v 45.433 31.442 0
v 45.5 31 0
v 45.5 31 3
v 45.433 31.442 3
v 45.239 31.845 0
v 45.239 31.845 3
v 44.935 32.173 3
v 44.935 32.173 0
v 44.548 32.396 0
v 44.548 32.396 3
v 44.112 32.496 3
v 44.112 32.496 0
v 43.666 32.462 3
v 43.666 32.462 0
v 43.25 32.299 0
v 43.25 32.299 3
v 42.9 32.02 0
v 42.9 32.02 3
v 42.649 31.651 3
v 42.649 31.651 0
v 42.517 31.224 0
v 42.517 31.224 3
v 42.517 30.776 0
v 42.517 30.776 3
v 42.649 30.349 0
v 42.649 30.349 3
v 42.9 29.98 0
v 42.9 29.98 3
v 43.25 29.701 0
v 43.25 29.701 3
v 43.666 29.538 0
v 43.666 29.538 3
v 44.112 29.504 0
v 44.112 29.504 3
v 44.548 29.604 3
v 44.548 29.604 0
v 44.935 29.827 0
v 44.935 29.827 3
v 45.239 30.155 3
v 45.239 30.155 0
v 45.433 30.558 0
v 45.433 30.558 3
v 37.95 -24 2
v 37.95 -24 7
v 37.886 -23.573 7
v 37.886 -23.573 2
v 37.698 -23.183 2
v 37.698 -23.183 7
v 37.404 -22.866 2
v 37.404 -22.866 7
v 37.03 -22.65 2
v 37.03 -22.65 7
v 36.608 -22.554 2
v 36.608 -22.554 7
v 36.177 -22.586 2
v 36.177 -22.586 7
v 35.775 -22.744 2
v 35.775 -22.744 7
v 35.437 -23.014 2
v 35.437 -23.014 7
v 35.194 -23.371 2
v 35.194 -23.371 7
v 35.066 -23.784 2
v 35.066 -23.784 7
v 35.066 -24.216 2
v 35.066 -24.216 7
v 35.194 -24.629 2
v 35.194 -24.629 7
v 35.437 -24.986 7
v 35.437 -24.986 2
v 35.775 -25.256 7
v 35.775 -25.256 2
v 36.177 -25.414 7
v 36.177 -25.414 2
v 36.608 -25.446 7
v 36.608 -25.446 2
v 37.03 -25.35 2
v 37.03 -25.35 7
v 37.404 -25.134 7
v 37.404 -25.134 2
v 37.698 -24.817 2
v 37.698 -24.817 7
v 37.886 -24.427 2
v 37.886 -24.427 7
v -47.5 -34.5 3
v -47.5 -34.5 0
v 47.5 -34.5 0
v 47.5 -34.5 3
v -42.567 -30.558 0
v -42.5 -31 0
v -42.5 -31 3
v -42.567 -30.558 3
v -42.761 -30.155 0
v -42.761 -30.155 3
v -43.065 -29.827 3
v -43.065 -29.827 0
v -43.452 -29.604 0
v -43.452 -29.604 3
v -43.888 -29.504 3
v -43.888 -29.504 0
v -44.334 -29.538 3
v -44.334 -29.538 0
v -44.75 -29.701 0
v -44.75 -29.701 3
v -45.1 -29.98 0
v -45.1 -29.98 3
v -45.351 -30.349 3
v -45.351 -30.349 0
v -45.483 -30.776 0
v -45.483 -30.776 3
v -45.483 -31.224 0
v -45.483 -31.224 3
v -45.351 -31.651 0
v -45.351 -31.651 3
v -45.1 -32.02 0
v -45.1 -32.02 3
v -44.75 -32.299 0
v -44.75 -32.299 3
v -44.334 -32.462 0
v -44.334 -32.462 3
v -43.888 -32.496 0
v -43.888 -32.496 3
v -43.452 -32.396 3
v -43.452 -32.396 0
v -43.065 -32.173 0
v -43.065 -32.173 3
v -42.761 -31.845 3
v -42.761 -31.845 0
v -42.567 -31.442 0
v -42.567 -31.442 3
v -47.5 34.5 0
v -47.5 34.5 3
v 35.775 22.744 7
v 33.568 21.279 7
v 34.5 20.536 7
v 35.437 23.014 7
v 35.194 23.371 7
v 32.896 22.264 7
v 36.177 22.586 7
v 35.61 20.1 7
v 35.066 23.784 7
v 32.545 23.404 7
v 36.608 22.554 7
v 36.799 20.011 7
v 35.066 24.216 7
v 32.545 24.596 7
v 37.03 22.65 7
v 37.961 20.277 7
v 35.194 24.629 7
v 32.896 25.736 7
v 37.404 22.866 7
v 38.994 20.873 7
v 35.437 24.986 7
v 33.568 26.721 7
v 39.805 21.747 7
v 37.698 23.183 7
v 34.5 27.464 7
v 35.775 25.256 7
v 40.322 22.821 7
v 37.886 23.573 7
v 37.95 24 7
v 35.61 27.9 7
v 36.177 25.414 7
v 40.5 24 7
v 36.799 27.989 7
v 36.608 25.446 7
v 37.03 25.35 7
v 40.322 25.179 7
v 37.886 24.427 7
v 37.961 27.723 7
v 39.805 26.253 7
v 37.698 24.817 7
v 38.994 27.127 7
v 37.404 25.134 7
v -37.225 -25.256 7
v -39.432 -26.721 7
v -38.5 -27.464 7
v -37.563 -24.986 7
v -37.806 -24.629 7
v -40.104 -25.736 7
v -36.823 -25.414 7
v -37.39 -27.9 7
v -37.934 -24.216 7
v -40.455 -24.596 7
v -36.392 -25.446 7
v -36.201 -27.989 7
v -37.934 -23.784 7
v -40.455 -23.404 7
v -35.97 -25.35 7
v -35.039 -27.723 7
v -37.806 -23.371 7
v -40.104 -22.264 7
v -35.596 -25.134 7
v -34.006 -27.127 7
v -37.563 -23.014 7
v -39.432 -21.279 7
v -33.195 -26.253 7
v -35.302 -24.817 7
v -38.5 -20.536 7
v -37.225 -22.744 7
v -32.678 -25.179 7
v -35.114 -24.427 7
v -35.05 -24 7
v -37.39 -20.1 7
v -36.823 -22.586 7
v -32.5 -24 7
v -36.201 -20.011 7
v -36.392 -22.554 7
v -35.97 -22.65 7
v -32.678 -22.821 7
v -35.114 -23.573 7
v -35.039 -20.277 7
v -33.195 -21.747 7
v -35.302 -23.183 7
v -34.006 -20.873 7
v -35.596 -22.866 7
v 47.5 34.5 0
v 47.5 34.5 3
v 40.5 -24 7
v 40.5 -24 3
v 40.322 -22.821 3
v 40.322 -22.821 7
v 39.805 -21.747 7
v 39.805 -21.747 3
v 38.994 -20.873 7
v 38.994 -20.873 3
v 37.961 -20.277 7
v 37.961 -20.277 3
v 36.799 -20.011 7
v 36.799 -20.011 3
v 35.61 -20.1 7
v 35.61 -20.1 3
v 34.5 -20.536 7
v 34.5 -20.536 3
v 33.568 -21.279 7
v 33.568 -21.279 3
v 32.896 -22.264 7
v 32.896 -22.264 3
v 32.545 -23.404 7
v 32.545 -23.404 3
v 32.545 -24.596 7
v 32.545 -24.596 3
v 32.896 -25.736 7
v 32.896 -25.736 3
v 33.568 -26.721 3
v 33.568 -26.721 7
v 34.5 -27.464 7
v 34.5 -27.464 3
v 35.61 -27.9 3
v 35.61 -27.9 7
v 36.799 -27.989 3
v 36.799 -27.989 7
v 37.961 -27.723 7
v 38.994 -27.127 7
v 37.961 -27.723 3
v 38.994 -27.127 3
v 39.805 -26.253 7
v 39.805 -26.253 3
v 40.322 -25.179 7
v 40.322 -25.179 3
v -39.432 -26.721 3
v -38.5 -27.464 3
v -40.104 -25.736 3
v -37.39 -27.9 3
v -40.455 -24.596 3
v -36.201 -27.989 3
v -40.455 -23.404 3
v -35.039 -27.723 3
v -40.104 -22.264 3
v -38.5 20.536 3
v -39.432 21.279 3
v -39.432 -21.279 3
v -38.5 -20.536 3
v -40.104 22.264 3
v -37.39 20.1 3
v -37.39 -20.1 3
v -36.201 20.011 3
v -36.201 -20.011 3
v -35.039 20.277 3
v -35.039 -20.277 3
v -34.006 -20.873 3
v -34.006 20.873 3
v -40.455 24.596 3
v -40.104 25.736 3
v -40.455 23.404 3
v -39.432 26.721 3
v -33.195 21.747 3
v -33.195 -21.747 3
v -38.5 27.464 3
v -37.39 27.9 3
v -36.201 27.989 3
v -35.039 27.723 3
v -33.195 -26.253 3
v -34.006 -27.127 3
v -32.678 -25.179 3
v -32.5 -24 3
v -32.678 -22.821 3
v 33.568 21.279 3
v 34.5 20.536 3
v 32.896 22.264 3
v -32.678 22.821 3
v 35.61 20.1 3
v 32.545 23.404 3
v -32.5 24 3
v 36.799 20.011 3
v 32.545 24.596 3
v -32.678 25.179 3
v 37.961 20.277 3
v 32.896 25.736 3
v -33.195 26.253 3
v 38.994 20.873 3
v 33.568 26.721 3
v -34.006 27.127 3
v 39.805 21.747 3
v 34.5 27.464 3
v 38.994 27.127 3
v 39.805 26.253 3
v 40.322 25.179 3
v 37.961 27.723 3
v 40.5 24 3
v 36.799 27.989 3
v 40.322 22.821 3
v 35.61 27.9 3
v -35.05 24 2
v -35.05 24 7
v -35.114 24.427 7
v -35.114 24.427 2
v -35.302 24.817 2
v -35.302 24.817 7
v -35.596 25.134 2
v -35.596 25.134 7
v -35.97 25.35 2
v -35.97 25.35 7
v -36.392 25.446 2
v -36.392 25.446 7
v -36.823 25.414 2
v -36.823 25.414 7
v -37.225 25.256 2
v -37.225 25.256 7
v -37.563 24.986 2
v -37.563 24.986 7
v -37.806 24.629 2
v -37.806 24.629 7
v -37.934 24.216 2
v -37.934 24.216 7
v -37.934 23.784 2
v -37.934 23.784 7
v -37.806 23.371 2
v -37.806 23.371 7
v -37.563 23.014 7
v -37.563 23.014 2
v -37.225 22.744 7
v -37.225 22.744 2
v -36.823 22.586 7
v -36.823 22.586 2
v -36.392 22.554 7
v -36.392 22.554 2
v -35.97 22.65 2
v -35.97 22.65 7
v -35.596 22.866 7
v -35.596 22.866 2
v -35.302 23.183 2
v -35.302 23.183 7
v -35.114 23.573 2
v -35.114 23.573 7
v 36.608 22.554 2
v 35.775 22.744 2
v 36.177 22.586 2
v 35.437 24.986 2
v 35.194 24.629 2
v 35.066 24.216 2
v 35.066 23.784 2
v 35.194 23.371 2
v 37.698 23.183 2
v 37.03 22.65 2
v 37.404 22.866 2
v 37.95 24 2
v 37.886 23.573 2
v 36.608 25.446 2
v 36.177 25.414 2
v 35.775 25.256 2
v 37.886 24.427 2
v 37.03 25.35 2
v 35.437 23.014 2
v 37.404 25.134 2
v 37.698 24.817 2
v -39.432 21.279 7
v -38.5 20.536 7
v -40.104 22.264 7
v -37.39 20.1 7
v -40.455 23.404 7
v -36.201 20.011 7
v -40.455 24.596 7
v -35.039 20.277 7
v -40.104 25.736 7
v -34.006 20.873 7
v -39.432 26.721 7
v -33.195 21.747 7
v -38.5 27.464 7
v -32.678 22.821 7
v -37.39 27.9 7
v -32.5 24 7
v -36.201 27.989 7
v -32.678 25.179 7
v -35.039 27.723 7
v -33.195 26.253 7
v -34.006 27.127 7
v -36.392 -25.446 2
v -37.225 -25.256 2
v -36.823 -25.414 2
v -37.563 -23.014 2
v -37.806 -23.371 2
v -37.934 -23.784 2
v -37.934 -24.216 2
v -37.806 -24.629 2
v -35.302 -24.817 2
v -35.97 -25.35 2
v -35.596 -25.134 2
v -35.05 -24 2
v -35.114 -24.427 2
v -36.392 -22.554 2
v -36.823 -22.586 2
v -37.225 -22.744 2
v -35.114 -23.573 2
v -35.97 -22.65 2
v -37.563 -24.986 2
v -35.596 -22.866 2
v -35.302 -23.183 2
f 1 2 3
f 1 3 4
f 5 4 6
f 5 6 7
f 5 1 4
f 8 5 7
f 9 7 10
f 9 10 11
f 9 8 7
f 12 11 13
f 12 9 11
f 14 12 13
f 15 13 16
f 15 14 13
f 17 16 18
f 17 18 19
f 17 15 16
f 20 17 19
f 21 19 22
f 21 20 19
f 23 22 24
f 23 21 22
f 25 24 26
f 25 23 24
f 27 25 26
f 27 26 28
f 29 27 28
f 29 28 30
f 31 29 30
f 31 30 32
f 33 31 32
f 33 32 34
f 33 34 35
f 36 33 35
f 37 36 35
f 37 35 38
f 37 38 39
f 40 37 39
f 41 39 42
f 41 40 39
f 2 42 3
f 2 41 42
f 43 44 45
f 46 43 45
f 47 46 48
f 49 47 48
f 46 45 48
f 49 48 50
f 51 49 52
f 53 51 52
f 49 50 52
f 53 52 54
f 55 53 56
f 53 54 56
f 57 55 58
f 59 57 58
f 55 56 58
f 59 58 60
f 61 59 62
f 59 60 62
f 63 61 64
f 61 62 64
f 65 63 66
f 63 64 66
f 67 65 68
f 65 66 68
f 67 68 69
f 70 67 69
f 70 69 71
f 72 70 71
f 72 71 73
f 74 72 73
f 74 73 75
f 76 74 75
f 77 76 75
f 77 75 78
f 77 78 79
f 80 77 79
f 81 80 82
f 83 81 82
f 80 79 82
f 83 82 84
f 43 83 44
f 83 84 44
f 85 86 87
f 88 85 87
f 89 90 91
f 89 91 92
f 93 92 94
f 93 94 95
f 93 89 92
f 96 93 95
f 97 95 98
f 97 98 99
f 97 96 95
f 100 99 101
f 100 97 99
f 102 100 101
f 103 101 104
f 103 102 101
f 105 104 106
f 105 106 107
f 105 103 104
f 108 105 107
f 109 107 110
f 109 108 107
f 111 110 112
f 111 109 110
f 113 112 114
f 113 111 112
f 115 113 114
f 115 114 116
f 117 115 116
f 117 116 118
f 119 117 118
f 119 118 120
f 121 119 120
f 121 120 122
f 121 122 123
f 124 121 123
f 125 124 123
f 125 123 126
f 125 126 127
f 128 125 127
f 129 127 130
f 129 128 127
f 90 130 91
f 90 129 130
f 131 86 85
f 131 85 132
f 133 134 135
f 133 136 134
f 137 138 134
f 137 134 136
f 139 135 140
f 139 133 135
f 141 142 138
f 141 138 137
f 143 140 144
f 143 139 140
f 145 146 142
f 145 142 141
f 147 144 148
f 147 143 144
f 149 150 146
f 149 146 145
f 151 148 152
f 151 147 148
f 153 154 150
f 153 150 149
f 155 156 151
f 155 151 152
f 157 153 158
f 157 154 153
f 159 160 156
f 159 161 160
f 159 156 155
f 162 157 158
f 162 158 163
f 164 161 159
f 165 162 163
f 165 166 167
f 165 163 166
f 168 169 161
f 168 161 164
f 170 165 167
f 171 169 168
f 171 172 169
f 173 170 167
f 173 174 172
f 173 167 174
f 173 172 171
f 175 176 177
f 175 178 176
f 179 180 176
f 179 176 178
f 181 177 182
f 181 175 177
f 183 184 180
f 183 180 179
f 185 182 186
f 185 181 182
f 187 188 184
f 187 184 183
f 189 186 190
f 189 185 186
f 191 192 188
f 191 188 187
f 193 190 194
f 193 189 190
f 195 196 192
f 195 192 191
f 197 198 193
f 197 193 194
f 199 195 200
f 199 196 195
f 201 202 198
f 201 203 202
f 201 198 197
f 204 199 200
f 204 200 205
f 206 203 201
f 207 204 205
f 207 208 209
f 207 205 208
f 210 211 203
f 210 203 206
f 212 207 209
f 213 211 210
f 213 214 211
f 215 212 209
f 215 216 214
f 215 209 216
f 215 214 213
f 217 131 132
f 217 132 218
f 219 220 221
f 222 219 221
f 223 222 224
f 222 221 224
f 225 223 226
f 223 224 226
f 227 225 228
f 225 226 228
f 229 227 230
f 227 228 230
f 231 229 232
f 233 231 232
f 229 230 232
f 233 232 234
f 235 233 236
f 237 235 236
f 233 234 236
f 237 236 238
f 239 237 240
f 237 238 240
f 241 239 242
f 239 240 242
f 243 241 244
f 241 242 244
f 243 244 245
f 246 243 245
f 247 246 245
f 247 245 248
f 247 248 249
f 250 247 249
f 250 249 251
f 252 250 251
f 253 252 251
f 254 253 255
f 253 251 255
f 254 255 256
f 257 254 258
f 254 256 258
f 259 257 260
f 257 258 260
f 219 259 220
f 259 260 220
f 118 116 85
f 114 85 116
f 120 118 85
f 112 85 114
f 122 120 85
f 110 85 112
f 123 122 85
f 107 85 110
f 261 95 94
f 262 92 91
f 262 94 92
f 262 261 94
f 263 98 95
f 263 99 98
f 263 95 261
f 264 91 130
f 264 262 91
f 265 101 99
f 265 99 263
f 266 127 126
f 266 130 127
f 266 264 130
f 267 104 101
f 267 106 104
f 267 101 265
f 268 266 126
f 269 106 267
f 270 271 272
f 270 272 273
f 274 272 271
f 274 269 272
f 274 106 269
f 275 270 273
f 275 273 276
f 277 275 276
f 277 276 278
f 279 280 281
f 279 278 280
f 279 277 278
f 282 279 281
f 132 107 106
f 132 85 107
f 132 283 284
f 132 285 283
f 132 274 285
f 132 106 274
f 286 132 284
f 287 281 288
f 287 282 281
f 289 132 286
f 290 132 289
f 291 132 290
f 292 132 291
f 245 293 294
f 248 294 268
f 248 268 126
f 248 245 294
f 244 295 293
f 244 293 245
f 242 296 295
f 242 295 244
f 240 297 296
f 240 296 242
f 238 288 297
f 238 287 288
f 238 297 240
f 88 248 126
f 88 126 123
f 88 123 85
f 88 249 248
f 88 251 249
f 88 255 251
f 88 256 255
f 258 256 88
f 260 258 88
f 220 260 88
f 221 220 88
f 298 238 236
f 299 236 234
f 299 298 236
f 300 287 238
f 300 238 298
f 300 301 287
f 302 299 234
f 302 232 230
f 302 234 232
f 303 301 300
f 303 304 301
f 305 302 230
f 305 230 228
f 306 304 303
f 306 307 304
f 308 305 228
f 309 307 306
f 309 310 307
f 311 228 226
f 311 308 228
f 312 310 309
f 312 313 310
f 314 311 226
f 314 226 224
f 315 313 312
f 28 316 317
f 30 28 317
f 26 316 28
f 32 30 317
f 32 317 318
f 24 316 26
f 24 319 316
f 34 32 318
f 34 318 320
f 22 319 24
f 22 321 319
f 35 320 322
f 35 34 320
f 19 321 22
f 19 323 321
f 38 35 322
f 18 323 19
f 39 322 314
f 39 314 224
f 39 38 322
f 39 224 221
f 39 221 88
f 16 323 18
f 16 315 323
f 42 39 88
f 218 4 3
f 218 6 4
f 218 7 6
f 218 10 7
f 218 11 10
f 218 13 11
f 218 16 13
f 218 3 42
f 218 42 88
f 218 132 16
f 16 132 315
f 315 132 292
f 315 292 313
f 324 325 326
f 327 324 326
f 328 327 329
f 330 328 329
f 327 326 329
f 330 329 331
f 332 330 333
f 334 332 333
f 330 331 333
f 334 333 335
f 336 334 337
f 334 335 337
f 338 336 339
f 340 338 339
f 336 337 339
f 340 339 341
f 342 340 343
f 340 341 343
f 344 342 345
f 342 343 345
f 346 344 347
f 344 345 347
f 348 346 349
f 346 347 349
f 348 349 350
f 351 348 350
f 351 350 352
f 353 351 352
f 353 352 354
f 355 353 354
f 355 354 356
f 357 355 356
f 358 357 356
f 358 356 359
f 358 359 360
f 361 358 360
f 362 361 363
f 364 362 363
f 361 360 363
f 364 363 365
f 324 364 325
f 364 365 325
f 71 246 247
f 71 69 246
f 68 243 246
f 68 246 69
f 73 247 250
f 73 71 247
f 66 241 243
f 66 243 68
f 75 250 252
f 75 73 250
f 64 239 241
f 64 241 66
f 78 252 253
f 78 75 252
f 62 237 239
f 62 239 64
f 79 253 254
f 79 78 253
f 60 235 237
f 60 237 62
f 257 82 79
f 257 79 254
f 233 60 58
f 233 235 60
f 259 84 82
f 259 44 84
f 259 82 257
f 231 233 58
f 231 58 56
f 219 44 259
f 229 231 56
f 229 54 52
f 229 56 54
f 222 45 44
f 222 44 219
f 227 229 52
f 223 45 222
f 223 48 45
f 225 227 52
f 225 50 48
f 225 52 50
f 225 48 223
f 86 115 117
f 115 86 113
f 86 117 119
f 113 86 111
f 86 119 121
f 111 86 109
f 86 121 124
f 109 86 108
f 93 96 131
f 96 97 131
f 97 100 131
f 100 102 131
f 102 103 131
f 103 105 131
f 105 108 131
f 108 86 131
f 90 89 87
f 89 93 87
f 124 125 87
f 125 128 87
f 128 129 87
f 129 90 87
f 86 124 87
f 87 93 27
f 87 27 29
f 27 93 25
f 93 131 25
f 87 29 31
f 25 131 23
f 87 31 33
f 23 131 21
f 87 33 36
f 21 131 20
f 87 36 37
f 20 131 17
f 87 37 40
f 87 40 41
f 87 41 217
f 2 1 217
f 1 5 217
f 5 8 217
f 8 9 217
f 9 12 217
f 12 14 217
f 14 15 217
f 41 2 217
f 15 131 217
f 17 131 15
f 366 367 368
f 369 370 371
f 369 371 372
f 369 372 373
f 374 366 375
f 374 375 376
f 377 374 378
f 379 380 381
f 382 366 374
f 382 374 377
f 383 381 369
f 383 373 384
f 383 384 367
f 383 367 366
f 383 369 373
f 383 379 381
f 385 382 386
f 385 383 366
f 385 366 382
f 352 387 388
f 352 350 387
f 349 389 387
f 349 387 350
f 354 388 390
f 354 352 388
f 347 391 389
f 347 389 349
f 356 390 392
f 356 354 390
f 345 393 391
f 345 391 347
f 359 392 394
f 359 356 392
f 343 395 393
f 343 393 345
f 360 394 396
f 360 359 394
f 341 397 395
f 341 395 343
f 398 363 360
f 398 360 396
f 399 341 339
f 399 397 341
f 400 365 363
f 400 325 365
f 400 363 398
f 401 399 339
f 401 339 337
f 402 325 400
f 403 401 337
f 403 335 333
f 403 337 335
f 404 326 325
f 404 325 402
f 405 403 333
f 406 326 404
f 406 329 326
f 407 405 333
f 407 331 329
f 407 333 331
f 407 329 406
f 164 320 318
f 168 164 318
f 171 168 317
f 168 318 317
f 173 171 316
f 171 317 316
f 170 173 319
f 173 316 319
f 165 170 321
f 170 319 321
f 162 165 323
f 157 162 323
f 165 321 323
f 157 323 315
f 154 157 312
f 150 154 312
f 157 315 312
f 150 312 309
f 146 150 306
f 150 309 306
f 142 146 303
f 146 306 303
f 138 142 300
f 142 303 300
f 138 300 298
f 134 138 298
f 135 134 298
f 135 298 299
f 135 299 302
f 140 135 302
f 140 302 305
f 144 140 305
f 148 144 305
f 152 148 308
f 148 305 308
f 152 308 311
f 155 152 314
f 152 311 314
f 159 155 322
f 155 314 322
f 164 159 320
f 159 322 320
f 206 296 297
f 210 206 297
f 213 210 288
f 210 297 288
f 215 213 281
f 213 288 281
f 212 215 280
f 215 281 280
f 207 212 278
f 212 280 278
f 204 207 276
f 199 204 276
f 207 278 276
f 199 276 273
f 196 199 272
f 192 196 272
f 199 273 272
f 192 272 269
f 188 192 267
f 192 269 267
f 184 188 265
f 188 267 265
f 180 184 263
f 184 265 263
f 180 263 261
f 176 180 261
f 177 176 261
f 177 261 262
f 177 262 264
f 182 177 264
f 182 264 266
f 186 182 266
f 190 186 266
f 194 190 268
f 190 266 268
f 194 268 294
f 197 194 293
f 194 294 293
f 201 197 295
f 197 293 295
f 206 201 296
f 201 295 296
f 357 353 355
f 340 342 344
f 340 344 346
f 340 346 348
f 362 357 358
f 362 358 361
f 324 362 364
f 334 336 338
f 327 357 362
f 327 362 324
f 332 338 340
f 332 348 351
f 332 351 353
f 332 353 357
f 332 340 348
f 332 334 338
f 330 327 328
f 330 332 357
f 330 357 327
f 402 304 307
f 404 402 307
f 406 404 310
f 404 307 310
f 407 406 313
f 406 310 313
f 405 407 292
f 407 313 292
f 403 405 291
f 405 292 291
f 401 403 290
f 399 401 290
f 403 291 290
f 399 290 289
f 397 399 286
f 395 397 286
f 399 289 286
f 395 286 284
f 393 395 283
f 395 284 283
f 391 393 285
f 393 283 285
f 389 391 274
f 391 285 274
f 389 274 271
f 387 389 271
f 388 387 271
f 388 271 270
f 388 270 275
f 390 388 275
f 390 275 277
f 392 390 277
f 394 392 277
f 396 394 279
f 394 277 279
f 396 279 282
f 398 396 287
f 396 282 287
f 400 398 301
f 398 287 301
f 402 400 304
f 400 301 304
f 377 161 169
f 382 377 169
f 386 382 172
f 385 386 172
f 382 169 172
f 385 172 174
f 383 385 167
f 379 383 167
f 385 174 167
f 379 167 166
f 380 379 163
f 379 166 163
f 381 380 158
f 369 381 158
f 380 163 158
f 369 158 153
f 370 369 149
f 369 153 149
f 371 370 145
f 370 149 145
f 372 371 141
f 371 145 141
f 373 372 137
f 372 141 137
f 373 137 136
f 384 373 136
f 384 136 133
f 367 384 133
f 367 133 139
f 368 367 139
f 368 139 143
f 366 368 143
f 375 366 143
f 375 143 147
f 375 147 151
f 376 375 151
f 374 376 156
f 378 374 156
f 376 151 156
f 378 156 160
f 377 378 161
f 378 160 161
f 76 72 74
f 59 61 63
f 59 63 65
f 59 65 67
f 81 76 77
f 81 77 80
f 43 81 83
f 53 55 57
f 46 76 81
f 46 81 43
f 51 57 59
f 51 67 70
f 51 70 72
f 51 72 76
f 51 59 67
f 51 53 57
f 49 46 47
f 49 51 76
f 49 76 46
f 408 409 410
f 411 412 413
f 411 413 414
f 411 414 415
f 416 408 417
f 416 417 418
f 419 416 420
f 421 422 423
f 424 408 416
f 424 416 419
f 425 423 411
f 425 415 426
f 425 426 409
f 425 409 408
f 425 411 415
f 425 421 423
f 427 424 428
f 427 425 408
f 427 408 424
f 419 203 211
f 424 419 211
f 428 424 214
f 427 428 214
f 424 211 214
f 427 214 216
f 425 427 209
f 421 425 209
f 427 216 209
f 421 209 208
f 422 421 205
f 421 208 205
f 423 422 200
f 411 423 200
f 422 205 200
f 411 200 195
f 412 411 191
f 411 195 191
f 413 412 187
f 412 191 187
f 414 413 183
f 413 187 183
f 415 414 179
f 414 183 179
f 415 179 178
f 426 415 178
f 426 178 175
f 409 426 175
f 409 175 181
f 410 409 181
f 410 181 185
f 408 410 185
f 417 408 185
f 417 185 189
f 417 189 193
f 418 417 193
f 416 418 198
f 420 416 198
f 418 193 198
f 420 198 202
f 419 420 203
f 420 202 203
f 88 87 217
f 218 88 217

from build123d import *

# Parameters (mm, degrees)
SKETCH_W     = 95
SKETCH_H     = 69
SKETCH_R     = 1.5
PAD_DEPTH    = 3
SKETCH001_R  = 4
PAD001_DEPTH = 4
SKETCH002_R  = 1.45
POCKET_DEPTH = 5


with BuildPart() as part:
    # Sketch → Pad (new body)
    with BuildSketch(Plane.XY):
        Rectangle(SKETCH_W, SKETCH_H)
        with Locations((-44, -31)):
            Circle(SKETCH_R, mode=Mode.SUBTRACT)
        with Locations((44, 31)):
            Circle(SKETCH_R, mode=Mode.SUBTRACT)
    extrude(amount=PAD_DEPTH)

    # Sketch001 (on Face8 of Pad) → Pad001 (join)
    with BuildSketch(Plane.XY.offset(3)):
        with Locations((-36.5, 24)):
            Circle(SKETCH001_R)
        with Locations((-36.5, -24)):
            Circle(SKETCH001_R)
        with Locations((36.5, -24)):
            Circle(SKETCH001_R)
        with Locations((36.5, 24)):
            Circle(SKETCH001_R)
    extrude(amount=PAD001_DEPTH)

    # Sketch002 (on Face14 of Pad001) → Pocket (cut)
    with BuildSketch(Plane.XY.offset(7)):
        with Locations((-36.5, 24)):
            Circle(SKETCH002_R)
        with Locations((-36.5, -24)):
            Circle(SKETCH002_R)
        with Locations((36.5, 24)):
            Circle(SKETCH002_R)
        with Locations((36.5, -24)):
            Circle(SKETCH002_R)
    extrude(amount=-POCKET_DEPTH, mode=Mode.SUBTRACT)


solid = part.part
